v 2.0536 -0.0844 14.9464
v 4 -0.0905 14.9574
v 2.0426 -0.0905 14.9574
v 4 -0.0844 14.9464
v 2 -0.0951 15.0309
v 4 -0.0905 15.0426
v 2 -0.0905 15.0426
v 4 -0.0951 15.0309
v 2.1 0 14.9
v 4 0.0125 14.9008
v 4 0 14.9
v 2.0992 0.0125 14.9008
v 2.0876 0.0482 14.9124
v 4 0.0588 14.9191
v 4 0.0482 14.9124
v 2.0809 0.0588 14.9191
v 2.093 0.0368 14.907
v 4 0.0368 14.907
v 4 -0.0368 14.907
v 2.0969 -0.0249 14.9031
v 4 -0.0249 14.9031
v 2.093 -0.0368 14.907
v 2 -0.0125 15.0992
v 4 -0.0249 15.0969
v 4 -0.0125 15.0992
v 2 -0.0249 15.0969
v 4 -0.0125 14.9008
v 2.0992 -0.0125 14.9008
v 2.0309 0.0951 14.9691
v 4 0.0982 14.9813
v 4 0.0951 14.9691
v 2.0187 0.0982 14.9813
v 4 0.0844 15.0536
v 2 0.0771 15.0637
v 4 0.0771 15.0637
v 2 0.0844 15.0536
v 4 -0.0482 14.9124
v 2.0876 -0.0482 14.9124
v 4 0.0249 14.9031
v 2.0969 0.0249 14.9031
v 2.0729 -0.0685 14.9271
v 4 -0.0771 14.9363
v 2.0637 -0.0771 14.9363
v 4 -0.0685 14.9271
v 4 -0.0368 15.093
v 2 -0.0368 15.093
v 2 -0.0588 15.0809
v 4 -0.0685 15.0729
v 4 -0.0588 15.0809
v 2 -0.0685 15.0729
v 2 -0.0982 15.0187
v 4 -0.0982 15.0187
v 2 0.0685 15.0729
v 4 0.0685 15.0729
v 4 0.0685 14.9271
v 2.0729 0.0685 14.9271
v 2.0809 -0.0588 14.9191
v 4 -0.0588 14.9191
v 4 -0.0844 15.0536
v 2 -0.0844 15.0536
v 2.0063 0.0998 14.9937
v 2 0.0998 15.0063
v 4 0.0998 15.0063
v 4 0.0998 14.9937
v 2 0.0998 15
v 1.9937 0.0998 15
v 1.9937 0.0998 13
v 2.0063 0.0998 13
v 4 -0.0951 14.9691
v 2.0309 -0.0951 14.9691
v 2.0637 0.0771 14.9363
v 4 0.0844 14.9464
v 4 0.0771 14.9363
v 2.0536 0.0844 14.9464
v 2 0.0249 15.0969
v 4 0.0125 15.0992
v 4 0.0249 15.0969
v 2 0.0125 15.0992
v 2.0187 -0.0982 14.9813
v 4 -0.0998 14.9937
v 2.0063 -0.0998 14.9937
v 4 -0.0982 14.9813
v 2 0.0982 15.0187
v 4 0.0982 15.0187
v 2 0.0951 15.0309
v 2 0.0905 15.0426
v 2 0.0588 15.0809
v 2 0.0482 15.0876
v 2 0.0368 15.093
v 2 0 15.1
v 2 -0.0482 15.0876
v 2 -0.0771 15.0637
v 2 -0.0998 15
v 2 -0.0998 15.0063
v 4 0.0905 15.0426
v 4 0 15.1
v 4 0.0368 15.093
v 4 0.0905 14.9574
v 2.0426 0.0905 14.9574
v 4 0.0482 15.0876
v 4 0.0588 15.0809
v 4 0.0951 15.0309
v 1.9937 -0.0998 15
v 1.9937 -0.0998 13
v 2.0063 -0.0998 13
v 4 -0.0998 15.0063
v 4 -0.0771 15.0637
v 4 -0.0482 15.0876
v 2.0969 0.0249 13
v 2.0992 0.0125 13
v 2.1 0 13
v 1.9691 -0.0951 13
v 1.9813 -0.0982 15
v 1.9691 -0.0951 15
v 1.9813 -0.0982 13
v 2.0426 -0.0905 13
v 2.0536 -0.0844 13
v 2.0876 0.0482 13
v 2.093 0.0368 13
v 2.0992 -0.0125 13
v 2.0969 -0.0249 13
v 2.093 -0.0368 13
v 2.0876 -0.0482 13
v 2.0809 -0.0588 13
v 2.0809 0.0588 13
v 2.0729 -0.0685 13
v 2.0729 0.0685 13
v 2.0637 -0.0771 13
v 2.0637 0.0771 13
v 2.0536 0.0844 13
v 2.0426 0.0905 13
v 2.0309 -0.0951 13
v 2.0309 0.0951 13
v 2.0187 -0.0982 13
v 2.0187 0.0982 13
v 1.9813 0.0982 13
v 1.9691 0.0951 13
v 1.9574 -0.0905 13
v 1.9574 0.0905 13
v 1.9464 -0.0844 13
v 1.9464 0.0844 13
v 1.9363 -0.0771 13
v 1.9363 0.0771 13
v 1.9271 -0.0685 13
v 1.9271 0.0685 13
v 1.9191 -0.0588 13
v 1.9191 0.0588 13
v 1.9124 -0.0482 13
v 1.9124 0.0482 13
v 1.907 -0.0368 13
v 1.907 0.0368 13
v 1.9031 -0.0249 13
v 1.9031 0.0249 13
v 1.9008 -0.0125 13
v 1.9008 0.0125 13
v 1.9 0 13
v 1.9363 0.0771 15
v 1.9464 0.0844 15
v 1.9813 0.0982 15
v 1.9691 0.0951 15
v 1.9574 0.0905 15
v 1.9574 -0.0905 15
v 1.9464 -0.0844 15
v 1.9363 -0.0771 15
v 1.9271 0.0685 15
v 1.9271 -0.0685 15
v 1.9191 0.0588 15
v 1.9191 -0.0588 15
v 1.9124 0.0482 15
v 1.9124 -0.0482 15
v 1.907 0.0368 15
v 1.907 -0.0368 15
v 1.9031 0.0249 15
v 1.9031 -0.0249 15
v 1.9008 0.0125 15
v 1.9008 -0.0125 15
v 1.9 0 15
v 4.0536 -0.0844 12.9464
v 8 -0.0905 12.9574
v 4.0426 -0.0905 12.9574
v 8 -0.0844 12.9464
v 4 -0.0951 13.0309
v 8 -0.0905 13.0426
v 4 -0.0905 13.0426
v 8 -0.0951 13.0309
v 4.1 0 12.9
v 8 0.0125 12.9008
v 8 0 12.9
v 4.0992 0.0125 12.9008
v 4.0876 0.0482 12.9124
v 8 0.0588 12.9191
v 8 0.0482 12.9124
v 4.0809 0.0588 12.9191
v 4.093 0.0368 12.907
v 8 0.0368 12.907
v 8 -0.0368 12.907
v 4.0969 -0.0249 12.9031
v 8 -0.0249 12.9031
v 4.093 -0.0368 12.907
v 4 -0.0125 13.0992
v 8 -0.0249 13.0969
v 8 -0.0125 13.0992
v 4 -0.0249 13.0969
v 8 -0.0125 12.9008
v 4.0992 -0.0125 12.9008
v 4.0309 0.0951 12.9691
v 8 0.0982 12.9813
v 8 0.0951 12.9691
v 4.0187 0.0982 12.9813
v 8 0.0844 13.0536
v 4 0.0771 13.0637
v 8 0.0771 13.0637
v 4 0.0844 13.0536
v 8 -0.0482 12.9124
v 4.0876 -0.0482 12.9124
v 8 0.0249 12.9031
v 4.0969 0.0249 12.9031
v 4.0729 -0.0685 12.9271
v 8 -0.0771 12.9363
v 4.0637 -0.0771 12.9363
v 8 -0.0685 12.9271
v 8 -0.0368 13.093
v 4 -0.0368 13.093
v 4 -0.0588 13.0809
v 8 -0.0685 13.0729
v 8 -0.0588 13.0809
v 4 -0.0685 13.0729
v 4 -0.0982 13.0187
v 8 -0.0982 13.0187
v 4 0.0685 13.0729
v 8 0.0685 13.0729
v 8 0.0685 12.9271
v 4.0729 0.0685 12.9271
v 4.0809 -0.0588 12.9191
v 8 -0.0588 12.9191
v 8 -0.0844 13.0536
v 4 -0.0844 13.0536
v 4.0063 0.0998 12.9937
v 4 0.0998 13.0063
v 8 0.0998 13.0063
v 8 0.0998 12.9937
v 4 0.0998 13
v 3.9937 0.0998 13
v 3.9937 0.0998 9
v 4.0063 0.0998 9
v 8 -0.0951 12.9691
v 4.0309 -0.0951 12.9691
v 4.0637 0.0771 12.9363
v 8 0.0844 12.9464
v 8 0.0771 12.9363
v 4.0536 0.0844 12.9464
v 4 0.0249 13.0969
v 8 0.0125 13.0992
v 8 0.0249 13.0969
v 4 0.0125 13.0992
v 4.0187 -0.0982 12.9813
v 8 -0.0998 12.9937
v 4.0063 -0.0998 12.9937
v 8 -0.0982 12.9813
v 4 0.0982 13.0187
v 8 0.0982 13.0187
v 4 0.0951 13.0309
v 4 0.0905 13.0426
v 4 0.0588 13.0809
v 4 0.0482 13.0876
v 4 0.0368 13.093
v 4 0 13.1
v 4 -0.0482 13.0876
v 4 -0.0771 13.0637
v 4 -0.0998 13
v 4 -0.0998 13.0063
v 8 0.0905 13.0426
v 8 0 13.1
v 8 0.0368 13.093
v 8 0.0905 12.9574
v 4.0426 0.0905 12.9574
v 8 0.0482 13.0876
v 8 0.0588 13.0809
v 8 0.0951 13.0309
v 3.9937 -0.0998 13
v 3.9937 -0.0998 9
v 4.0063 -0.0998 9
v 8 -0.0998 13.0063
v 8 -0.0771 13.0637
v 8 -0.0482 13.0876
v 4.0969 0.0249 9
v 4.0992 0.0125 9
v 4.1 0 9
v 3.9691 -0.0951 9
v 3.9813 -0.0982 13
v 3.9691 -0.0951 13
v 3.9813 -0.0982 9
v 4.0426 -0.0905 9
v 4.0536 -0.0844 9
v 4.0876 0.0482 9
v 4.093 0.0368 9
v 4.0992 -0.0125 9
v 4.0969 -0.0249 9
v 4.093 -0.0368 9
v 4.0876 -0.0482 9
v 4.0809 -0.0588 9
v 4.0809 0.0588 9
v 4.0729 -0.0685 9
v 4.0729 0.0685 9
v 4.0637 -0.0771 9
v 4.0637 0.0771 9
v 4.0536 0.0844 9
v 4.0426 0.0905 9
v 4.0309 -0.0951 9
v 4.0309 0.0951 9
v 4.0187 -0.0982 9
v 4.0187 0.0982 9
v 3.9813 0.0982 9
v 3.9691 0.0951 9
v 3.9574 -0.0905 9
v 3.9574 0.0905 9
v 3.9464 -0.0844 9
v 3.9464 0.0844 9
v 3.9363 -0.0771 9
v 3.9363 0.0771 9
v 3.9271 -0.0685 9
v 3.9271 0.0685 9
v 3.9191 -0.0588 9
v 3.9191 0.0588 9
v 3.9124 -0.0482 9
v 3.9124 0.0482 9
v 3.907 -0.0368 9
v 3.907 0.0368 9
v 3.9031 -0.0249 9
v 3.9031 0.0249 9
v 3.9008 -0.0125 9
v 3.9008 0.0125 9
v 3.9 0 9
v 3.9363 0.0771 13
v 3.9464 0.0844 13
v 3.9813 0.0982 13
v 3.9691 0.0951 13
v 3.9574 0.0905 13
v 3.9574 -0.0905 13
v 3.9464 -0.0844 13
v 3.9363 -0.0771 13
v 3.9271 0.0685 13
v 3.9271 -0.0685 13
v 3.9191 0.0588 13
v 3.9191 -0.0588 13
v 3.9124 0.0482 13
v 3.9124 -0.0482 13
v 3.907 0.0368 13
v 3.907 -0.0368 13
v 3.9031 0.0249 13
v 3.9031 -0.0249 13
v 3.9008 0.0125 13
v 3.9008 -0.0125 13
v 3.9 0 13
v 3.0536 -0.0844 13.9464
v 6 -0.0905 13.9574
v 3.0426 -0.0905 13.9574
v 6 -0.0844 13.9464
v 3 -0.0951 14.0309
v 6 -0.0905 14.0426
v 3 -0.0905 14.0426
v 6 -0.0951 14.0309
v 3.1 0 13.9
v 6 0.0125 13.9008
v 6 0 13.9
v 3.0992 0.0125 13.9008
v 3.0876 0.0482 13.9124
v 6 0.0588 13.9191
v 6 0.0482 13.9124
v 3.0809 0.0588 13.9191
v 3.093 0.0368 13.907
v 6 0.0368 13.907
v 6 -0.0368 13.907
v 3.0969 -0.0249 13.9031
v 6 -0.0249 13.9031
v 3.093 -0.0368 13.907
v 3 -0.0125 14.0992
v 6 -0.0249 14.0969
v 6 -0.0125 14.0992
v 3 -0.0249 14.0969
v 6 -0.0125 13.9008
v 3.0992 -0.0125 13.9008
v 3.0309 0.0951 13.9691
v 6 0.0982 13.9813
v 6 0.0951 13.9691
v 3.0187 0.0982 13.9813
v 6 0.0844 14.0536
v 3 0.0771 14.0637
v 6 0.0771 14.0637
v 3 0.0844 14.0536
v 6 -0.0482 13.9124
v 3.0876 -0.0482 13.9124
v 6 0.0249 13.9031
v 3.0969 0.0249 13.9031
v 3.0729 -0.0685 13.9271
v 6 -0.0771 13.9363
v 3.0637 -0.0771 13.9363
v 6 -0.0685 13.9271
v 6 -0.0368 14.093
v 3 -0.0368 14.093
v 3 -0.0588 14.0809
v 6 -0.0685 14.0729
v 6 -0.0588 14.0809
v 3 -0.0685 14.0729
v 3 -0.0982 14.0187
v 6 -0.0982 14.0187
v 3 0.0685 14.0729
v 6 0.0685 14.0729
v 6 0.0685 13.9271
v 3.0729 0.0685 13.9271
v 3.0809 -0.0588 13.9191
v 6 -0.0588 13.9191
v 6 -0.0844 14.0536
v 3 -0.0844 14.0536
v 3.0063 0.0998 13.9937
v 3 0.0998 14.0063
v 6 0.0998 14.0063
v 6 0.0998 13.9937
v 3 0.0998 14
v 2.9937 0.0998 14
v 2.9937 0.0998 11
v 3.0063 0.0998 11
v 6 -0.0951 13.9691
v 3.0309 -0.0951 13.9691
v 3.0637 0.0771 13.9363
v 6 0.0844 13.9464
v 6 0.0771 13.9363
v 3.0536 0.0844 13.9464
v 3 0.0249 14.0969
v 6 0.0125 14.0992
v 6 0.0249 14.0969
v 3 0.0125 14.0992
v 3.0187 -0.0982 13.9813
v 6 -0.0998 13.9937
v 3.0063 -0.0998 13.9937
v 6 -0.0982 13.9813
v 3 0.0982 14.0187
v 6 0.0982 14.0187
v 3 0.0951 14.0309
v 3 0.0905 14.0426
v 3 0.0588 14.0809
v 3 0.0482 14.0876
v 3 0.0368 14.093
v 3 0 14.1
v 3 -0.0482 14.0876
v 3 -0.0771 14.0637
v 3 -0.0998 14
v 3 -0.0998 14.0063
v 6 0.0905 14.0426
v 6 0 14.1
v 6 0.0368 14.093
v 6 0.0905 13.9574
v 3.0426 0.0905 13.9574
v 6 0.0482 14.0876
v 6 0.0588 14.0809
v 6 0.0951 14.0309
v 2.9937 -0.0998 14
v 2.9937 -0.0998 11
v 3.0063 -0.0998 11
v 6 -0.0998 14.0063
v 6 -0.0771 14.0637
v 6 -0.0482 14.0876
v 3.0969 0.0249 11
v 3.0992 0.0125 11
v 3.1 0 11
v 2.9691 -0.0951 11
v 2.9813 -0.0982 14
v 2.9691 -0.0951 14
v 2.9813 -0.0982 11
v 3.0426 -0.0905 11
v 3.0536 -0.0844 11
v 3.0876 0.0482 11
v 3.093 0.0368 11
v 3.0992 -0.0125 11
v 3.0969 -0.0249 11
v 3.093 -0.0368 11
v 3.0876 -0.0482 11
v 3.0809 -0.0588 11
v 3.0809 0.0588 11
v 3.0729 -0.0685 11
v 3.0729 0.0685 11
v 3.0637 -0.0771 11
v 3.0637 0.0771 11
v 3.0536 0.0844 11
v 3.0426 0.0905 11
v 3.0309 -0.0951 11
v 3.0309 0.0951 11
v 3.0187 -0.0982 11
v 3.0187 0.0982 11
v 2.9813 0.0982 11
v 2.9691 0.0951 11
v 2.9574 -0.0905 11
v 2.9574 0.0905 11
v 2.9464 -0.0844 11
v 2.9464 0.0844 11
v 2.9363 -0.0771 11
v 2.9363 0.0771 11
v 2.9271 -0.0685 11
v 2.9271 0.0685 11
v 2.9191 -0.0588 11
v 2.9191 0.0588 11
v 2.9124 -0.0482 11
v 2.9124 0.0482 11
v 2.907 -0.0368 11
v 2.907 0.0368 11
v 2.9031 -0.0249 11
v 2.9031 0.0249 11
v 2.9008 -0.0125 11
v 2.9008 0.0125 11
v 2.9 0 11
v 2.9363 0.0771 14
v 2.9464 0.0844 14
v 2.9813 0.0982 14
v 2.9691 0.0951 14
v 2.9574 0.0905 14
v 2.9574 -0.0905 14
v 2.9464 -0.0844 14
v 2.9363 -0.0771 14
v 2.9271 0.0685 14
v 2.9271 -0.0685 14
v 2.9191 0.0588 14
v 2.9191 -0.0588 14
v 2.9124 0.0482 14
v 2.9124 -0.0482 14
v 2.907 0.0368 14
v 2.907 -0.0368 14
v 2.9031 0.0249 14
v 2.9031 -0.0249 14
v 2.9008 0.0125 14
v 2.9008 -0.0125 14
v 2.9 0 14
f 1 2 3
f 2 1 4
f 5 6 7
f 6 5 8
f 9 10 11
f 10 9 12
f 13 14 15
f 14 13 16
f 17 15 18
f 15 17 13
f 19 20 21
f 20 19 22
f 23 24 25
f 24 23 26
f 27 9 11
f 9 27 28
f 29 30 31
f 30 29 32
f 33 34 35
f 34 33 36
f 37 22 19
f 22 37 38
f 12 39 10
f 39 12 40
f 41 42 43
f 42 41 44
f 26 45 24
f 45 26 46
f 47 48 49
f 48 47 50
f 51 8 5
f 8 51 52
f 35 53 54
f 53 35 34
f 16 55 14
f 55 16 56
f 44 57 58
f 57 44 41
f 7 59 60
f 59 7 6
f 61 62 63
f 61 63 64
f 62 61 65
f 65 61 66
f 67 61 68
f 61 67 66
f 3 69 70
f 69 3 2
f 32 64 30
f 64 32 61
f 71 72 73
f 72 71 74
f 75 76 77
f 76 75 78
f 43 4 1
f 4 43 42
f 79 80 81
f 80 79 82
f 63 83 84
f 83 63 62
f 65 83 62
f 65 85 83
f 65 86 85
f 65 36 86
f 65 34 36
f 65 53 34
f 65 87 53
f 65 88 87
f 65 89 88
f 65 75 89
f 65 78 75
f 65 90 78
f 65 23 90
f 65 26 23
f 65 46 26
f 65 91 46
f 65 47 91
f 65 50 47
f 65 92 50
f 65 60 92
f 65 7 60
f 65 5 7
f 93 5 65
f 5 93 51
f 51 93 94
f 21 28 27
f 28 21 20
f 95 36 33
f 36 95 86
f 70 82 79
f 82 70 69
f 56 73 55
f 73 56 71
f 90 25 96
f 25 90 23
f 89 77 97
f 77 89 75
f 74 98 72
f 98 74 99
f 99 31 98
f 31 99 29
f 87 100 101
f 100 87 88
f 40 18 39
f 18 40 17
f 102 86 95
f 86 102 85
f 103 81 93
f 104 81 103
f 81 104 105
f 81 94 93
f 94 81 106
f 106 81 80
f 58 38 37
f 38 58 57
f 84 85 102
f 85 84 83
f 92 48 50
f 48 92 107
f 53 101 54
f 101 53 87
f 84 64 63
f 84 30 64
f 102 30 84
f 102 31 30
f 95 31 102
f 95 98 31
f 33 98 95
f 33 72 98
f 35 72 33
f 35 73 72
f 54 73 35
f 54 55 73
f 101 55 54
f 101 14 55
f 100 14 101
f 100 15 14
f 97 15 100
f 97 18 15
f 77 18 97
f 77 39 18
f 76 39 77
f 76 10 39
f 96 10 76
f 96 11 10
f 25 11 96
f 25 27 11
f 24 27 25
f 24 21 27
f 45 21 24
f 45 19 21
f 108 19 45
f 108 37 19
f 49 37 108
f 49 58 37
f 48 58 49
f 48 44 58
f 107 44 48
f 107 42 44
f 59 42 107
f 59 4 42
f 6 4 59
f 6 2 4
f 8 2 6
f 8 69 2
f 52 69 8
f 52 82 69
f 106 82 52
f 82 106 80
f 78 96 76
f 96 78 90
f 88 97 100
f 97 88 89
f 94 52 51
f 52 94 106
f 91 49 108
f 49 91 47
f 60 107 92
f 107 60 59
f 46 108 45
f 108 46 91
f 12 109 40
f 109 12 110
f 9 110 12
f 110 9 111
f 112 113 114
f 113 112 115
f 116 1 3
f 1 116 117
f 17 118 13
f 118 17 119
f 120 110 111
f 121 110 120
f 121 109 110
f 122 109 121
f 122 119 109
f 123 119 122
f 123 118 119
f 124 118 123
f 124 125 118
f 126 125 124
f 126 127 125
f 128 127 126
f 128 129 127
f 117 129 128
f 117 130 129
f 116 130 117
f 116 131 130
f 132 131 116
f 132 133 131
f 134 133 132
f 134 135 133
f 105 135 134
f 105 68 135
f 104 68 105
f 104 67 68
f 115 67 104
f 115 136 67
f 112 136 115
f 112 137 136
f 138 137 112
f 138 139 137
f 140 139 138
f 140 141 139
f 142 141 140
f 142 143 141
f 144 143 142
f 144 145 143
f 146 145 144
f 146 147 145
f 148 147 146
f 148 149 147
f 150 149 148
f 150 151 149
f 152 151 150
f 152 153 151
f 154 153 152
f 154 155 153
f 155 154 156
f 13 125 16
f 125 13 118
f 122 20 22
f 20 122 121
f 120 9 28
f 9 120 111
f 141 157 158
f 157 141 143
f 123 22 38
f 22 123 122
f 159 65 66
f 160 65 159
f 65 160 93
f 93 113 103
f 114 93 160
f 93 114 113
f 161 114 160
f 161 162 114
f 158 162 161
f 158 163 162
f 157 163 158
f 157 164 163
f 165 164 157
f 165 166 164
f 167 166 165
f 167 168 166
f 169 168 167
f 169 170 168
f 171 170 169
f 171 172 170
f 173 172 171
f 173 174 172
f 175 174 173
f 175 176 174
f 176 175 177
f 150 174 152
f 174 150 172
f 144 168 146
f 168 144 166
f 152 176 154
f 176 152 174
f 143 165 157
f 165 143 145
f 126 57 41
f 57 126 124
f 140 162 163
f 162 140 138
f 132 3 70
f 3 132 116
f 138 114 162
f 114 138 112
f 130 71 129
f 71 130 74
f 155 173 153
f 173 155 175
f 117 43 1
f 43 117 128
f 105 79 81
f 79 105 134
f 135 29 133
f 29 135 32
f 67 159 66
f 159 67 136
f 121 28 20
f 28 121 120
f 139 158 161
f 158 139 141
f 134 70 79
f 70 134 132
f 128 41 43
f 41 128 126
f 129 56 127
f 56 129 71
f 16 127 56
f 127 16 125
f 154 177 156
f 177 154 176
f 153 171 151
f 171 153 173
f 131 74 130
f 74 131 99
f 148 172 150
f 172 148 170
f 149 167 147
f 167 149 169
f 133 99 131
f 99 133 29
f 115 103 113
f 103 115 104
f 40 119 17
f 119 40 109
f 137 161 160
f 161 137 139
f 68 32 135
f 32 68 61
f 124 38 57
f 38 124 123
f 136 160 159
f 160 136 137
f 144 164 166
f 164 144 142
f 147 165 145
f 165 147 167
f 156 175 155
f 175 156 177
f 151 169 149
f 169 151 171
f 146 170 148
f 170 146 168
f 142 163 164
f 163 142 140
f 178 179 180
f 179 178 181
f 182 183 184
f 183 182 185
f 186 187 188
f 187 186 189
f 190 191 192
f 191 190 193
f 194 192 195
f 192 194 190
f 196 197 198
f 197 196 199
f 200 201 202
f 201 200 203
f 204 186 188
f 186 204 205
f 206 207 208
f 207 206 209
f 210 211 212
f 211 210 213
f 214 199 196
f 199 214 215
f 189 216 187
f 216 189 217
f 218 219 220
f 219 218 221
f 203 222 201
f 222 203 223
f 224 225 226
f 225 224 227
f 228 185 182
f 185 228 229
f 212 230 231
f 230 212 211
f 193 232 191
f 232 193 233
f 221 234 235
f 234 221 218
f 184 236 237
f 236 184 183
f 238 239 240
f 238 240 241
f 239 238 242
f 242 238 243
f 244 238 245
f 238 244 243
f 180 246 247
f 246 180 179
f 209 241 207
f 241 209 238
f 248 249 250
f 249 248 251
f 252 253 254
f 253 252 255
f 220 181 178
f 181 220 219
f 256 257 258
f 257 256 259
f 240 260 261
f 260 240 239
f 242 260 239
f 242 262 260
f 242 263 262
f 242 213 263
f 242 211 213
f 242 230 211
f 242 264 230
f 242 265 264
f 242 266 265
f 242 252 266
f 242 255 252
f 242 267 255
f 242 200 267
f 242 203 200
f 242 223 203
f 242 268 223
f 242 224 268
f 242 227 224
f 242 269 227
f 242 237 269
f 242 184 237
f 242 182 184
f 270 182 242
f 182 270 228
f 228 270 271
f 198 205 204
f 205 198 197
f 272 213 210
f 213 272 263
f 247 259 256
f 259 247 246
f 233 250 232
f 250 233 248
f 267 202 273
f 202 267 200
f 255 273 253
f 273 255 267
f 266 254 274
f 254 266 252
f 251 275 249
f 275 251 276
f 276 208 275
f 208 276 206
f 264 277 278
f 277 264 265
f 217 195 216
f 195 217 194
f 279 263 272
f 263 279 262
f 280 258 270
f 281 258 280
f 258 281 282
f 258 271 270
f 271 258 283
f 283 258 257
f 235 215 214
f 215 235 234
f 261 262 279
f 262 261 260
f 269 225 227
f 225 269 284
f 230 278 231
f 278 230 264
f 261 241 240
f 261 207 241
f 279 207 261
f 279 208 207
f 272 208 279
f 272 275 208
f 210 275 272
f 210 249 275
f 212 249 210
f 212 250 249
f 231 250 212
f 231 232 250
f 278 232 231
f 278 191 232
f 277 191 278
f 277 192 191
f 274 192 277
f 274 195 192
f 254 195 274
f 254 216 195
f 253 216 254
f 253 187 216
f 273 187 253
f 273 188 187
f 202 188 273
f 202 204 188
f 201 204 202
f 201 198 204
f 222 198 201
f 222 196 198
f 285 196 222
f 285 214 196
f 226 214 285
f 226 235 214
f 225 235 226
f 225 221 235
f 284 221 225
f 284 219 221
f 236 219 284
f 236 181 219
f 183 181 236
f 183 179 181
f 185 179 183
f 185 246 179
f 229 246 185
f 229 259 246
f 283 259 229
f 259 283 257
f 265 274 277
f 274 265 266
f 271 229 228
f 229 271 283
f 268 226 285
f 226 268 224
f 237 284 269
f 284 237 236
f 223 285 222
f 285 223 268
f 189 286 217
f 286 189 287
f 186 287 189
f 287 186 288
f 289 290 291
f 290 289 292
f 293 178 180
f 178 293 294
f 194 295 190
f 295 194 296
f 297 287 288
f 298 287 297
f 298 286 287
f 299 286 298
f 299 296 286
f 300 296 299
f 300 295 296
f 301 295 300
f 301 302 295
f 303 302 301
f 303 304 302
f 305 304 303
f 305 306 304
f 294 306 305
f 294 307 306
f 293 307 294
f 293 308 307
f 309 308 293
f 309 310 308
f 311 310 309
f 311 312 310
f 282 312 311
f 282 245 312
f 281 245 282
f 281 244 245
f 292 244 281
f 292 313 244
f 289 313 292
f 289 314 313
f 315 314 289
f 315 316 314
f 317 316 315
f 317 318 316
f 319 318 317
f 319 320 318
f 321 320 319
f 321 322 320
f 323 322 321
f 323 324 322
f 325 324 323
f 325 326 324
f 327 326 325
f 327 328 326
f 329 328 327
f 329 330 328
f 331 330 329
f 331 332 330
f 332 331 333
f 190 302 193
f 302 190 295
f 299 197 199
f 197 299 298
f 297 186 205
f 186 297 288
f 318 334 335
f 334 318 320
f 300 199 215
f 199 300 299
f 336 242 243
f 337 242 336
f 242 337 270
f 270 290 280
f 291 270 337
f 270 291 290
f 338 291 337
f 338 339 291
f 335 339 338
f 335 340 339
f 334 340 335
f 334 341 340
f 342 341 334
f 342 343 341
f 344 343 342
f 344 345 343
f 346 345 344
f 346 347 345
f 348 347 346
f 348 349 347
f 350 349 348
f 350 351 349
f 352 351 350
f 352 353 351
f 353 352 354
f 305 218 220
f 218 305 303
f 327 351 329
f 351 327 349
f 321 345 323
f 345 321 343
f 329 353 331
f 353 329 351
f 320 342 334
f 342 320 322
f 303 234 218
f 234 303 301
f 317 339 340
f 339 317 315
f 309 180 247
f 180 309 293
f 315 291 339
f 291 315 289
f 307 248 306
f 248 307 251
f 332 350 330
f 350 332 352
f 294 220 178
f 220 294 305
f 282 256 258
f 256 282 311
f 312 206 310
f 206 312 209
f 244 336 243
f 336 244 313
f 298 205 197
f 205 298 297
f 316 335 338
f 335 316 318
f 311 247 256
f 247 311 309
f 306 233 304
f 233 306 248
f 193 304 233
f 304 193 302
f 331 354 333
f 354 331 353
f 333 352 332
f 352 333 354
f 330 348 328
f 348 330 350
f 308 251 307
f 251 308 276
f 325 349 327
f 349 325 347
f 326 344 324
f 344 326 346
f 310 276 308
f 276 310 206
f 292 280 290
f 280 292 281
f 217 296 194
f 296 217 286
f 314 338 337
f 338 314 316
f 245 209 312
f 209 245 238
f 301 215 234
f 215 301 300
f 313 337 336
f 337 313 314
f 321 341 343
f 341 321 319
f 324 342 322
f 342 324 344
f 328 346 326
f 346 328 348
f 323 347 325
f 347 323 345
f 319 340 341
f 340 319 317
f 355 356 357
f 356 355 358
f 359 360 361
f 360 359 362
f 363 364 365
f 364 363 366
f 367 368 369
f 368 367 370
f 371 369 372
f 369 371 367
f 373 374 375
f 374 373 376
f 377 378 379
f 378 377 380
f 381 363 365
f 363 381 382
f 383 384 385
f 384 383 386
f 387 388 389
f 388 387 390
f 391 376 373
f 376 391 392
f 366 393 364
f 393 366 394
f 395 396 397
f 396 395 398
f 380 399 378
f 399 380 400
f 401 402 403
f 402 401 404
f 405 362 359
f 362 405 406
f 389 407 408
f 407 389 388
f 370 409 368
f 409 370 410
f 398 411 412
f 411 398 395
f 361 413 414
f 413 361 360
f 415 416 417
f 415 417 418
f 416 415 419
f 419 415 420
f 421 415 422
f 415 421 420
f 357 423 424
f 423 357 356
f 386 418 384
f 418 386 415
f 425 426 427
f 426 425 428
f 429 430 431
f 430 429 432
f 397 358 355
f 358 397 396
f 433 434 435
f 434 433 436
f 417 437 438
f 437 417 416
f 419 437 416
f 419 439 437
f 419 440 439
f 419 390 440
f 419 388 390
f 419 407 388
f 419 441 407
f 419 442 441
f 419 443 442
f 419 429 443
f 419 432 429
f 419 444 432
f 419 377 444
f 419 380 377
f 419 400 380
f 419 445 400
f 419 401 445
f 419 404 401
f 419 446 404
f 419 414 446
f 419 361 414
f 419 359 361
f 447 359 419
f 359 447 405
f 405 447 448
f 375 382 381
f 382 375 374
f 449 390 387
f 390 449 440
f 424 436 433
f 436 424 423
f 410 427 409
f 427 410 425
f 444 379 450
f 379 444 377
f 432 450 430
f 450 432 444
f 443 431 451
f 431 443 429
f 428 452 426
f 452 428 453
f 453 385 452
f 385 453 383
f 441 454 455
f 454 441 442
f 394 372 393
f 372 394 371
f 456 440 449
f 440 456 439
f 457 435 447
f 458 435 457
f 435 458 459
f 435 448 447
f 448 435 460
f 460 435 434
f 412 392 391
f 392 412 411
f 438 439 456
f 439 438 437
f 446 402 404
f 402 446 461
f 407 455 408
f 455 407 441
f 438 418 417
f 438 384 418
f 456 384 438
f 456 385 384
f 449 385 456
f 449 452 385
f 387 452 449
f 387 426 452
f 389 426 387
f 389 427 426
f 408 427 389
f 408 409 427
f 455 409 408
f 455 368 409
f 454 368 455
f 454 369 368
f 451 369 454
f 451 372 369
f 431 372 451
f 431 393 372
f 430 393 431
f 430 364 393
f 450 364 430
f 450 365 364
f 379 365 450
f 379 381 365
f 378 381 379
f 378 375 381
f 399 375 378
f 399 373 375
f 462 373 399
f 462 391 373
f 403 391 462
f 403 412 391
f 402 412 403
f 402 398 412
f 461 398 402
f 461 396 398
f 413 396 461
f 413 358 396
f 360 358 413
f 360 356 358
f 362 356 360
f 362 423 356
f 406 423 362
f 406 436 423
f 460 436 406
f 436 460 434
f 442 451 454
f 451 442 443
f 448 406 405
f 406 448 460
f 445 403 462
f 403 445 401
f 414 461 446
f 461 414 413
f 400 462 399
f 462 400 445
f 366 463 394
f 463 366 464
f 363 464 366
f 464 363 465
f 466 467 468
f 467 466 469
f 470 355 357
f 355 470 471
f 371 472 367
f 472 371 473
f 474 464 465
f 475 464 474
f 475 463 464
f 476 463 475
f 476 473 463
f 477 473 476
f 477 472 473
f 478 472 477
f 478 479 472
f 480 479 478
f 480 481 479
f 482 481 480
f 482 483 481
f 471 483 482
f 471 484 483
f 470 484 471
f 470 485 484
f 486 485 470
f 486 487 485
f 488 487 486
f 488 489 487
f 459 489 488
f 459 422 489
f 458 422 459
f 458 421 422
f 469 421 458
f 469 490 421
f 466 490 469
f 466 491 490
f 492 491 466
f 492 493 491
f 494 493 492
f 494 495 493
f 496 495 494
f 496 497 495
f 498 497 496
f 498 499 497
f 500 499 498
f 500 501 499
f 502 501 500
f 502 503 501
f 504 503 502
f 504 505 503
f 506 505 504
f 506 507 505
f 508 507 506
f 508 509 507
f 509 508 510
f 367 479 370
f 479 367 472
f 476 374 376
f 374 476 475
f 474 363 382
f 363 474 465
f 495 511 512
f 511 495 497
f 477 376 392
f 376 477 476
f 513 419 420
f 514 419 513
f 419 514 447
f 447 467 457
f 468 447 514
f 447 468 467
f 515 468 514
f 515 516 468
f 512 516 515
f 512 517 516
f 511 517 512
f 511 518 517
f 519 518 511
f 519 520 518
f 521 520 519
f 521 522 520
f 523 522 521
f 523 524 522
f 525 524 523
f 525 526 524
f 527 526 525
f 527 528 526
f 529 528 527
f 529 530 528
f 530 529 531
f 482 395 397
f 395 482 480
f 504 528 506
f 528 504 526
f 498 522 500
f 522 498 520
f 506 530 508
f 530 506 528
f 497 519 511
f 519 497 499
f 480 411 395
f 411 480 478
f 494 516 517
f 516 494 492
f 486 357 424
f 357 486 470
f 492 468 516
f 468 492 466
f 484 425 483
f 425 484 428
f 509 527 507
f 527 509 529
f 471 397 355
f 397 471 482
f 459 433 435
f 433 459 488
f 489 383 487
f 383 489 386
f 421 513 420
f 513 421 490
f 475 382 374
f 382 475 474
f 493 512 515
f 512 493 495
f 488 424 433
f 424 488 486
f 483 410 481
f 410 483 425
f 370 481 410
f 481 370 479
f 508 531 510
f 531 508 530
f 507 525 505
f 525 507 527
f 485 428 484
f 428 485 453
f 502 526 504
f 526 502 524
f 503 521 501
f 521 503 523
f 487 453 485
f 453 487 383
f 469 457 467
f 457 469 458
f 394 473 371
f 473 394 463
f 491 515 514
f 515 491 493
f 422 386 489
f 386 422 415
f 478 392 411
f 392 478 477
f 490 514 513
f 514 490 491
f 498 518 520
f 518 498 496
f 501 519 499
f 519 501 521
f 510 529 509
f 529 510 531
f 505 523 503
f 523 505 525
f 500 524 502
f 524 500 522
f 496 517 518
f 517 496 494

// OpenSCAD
translate([2, 0, 15]) {
	rotate([0, 90, 0]) {
		cylinder(h = 2, $fn = 50, r = 0.1);
	}
}
translate([2, 0, 13]) {
	cylinder(h = 2, $fn = 50, r = 0.1);
}
translate([4, 0, 13]) {
	rotate([0, 90, 0]) {
		cylinder(h = 4, $fn = 50, r = 0.1);
	}
}
translate([4, 0, 9]) {
	cylinder(h = 4, $fn = 50, r = 0.1);
}
translate([3, 0, 14]) {
	rotate([0, 90, 0]) {
		cylinder(h = 3, $fn = 50, r = 0.1);
	}
}
translate([3, 0, 11]) {
	cylinder(h = 3, $fn = 50, r = 0.1);
}
